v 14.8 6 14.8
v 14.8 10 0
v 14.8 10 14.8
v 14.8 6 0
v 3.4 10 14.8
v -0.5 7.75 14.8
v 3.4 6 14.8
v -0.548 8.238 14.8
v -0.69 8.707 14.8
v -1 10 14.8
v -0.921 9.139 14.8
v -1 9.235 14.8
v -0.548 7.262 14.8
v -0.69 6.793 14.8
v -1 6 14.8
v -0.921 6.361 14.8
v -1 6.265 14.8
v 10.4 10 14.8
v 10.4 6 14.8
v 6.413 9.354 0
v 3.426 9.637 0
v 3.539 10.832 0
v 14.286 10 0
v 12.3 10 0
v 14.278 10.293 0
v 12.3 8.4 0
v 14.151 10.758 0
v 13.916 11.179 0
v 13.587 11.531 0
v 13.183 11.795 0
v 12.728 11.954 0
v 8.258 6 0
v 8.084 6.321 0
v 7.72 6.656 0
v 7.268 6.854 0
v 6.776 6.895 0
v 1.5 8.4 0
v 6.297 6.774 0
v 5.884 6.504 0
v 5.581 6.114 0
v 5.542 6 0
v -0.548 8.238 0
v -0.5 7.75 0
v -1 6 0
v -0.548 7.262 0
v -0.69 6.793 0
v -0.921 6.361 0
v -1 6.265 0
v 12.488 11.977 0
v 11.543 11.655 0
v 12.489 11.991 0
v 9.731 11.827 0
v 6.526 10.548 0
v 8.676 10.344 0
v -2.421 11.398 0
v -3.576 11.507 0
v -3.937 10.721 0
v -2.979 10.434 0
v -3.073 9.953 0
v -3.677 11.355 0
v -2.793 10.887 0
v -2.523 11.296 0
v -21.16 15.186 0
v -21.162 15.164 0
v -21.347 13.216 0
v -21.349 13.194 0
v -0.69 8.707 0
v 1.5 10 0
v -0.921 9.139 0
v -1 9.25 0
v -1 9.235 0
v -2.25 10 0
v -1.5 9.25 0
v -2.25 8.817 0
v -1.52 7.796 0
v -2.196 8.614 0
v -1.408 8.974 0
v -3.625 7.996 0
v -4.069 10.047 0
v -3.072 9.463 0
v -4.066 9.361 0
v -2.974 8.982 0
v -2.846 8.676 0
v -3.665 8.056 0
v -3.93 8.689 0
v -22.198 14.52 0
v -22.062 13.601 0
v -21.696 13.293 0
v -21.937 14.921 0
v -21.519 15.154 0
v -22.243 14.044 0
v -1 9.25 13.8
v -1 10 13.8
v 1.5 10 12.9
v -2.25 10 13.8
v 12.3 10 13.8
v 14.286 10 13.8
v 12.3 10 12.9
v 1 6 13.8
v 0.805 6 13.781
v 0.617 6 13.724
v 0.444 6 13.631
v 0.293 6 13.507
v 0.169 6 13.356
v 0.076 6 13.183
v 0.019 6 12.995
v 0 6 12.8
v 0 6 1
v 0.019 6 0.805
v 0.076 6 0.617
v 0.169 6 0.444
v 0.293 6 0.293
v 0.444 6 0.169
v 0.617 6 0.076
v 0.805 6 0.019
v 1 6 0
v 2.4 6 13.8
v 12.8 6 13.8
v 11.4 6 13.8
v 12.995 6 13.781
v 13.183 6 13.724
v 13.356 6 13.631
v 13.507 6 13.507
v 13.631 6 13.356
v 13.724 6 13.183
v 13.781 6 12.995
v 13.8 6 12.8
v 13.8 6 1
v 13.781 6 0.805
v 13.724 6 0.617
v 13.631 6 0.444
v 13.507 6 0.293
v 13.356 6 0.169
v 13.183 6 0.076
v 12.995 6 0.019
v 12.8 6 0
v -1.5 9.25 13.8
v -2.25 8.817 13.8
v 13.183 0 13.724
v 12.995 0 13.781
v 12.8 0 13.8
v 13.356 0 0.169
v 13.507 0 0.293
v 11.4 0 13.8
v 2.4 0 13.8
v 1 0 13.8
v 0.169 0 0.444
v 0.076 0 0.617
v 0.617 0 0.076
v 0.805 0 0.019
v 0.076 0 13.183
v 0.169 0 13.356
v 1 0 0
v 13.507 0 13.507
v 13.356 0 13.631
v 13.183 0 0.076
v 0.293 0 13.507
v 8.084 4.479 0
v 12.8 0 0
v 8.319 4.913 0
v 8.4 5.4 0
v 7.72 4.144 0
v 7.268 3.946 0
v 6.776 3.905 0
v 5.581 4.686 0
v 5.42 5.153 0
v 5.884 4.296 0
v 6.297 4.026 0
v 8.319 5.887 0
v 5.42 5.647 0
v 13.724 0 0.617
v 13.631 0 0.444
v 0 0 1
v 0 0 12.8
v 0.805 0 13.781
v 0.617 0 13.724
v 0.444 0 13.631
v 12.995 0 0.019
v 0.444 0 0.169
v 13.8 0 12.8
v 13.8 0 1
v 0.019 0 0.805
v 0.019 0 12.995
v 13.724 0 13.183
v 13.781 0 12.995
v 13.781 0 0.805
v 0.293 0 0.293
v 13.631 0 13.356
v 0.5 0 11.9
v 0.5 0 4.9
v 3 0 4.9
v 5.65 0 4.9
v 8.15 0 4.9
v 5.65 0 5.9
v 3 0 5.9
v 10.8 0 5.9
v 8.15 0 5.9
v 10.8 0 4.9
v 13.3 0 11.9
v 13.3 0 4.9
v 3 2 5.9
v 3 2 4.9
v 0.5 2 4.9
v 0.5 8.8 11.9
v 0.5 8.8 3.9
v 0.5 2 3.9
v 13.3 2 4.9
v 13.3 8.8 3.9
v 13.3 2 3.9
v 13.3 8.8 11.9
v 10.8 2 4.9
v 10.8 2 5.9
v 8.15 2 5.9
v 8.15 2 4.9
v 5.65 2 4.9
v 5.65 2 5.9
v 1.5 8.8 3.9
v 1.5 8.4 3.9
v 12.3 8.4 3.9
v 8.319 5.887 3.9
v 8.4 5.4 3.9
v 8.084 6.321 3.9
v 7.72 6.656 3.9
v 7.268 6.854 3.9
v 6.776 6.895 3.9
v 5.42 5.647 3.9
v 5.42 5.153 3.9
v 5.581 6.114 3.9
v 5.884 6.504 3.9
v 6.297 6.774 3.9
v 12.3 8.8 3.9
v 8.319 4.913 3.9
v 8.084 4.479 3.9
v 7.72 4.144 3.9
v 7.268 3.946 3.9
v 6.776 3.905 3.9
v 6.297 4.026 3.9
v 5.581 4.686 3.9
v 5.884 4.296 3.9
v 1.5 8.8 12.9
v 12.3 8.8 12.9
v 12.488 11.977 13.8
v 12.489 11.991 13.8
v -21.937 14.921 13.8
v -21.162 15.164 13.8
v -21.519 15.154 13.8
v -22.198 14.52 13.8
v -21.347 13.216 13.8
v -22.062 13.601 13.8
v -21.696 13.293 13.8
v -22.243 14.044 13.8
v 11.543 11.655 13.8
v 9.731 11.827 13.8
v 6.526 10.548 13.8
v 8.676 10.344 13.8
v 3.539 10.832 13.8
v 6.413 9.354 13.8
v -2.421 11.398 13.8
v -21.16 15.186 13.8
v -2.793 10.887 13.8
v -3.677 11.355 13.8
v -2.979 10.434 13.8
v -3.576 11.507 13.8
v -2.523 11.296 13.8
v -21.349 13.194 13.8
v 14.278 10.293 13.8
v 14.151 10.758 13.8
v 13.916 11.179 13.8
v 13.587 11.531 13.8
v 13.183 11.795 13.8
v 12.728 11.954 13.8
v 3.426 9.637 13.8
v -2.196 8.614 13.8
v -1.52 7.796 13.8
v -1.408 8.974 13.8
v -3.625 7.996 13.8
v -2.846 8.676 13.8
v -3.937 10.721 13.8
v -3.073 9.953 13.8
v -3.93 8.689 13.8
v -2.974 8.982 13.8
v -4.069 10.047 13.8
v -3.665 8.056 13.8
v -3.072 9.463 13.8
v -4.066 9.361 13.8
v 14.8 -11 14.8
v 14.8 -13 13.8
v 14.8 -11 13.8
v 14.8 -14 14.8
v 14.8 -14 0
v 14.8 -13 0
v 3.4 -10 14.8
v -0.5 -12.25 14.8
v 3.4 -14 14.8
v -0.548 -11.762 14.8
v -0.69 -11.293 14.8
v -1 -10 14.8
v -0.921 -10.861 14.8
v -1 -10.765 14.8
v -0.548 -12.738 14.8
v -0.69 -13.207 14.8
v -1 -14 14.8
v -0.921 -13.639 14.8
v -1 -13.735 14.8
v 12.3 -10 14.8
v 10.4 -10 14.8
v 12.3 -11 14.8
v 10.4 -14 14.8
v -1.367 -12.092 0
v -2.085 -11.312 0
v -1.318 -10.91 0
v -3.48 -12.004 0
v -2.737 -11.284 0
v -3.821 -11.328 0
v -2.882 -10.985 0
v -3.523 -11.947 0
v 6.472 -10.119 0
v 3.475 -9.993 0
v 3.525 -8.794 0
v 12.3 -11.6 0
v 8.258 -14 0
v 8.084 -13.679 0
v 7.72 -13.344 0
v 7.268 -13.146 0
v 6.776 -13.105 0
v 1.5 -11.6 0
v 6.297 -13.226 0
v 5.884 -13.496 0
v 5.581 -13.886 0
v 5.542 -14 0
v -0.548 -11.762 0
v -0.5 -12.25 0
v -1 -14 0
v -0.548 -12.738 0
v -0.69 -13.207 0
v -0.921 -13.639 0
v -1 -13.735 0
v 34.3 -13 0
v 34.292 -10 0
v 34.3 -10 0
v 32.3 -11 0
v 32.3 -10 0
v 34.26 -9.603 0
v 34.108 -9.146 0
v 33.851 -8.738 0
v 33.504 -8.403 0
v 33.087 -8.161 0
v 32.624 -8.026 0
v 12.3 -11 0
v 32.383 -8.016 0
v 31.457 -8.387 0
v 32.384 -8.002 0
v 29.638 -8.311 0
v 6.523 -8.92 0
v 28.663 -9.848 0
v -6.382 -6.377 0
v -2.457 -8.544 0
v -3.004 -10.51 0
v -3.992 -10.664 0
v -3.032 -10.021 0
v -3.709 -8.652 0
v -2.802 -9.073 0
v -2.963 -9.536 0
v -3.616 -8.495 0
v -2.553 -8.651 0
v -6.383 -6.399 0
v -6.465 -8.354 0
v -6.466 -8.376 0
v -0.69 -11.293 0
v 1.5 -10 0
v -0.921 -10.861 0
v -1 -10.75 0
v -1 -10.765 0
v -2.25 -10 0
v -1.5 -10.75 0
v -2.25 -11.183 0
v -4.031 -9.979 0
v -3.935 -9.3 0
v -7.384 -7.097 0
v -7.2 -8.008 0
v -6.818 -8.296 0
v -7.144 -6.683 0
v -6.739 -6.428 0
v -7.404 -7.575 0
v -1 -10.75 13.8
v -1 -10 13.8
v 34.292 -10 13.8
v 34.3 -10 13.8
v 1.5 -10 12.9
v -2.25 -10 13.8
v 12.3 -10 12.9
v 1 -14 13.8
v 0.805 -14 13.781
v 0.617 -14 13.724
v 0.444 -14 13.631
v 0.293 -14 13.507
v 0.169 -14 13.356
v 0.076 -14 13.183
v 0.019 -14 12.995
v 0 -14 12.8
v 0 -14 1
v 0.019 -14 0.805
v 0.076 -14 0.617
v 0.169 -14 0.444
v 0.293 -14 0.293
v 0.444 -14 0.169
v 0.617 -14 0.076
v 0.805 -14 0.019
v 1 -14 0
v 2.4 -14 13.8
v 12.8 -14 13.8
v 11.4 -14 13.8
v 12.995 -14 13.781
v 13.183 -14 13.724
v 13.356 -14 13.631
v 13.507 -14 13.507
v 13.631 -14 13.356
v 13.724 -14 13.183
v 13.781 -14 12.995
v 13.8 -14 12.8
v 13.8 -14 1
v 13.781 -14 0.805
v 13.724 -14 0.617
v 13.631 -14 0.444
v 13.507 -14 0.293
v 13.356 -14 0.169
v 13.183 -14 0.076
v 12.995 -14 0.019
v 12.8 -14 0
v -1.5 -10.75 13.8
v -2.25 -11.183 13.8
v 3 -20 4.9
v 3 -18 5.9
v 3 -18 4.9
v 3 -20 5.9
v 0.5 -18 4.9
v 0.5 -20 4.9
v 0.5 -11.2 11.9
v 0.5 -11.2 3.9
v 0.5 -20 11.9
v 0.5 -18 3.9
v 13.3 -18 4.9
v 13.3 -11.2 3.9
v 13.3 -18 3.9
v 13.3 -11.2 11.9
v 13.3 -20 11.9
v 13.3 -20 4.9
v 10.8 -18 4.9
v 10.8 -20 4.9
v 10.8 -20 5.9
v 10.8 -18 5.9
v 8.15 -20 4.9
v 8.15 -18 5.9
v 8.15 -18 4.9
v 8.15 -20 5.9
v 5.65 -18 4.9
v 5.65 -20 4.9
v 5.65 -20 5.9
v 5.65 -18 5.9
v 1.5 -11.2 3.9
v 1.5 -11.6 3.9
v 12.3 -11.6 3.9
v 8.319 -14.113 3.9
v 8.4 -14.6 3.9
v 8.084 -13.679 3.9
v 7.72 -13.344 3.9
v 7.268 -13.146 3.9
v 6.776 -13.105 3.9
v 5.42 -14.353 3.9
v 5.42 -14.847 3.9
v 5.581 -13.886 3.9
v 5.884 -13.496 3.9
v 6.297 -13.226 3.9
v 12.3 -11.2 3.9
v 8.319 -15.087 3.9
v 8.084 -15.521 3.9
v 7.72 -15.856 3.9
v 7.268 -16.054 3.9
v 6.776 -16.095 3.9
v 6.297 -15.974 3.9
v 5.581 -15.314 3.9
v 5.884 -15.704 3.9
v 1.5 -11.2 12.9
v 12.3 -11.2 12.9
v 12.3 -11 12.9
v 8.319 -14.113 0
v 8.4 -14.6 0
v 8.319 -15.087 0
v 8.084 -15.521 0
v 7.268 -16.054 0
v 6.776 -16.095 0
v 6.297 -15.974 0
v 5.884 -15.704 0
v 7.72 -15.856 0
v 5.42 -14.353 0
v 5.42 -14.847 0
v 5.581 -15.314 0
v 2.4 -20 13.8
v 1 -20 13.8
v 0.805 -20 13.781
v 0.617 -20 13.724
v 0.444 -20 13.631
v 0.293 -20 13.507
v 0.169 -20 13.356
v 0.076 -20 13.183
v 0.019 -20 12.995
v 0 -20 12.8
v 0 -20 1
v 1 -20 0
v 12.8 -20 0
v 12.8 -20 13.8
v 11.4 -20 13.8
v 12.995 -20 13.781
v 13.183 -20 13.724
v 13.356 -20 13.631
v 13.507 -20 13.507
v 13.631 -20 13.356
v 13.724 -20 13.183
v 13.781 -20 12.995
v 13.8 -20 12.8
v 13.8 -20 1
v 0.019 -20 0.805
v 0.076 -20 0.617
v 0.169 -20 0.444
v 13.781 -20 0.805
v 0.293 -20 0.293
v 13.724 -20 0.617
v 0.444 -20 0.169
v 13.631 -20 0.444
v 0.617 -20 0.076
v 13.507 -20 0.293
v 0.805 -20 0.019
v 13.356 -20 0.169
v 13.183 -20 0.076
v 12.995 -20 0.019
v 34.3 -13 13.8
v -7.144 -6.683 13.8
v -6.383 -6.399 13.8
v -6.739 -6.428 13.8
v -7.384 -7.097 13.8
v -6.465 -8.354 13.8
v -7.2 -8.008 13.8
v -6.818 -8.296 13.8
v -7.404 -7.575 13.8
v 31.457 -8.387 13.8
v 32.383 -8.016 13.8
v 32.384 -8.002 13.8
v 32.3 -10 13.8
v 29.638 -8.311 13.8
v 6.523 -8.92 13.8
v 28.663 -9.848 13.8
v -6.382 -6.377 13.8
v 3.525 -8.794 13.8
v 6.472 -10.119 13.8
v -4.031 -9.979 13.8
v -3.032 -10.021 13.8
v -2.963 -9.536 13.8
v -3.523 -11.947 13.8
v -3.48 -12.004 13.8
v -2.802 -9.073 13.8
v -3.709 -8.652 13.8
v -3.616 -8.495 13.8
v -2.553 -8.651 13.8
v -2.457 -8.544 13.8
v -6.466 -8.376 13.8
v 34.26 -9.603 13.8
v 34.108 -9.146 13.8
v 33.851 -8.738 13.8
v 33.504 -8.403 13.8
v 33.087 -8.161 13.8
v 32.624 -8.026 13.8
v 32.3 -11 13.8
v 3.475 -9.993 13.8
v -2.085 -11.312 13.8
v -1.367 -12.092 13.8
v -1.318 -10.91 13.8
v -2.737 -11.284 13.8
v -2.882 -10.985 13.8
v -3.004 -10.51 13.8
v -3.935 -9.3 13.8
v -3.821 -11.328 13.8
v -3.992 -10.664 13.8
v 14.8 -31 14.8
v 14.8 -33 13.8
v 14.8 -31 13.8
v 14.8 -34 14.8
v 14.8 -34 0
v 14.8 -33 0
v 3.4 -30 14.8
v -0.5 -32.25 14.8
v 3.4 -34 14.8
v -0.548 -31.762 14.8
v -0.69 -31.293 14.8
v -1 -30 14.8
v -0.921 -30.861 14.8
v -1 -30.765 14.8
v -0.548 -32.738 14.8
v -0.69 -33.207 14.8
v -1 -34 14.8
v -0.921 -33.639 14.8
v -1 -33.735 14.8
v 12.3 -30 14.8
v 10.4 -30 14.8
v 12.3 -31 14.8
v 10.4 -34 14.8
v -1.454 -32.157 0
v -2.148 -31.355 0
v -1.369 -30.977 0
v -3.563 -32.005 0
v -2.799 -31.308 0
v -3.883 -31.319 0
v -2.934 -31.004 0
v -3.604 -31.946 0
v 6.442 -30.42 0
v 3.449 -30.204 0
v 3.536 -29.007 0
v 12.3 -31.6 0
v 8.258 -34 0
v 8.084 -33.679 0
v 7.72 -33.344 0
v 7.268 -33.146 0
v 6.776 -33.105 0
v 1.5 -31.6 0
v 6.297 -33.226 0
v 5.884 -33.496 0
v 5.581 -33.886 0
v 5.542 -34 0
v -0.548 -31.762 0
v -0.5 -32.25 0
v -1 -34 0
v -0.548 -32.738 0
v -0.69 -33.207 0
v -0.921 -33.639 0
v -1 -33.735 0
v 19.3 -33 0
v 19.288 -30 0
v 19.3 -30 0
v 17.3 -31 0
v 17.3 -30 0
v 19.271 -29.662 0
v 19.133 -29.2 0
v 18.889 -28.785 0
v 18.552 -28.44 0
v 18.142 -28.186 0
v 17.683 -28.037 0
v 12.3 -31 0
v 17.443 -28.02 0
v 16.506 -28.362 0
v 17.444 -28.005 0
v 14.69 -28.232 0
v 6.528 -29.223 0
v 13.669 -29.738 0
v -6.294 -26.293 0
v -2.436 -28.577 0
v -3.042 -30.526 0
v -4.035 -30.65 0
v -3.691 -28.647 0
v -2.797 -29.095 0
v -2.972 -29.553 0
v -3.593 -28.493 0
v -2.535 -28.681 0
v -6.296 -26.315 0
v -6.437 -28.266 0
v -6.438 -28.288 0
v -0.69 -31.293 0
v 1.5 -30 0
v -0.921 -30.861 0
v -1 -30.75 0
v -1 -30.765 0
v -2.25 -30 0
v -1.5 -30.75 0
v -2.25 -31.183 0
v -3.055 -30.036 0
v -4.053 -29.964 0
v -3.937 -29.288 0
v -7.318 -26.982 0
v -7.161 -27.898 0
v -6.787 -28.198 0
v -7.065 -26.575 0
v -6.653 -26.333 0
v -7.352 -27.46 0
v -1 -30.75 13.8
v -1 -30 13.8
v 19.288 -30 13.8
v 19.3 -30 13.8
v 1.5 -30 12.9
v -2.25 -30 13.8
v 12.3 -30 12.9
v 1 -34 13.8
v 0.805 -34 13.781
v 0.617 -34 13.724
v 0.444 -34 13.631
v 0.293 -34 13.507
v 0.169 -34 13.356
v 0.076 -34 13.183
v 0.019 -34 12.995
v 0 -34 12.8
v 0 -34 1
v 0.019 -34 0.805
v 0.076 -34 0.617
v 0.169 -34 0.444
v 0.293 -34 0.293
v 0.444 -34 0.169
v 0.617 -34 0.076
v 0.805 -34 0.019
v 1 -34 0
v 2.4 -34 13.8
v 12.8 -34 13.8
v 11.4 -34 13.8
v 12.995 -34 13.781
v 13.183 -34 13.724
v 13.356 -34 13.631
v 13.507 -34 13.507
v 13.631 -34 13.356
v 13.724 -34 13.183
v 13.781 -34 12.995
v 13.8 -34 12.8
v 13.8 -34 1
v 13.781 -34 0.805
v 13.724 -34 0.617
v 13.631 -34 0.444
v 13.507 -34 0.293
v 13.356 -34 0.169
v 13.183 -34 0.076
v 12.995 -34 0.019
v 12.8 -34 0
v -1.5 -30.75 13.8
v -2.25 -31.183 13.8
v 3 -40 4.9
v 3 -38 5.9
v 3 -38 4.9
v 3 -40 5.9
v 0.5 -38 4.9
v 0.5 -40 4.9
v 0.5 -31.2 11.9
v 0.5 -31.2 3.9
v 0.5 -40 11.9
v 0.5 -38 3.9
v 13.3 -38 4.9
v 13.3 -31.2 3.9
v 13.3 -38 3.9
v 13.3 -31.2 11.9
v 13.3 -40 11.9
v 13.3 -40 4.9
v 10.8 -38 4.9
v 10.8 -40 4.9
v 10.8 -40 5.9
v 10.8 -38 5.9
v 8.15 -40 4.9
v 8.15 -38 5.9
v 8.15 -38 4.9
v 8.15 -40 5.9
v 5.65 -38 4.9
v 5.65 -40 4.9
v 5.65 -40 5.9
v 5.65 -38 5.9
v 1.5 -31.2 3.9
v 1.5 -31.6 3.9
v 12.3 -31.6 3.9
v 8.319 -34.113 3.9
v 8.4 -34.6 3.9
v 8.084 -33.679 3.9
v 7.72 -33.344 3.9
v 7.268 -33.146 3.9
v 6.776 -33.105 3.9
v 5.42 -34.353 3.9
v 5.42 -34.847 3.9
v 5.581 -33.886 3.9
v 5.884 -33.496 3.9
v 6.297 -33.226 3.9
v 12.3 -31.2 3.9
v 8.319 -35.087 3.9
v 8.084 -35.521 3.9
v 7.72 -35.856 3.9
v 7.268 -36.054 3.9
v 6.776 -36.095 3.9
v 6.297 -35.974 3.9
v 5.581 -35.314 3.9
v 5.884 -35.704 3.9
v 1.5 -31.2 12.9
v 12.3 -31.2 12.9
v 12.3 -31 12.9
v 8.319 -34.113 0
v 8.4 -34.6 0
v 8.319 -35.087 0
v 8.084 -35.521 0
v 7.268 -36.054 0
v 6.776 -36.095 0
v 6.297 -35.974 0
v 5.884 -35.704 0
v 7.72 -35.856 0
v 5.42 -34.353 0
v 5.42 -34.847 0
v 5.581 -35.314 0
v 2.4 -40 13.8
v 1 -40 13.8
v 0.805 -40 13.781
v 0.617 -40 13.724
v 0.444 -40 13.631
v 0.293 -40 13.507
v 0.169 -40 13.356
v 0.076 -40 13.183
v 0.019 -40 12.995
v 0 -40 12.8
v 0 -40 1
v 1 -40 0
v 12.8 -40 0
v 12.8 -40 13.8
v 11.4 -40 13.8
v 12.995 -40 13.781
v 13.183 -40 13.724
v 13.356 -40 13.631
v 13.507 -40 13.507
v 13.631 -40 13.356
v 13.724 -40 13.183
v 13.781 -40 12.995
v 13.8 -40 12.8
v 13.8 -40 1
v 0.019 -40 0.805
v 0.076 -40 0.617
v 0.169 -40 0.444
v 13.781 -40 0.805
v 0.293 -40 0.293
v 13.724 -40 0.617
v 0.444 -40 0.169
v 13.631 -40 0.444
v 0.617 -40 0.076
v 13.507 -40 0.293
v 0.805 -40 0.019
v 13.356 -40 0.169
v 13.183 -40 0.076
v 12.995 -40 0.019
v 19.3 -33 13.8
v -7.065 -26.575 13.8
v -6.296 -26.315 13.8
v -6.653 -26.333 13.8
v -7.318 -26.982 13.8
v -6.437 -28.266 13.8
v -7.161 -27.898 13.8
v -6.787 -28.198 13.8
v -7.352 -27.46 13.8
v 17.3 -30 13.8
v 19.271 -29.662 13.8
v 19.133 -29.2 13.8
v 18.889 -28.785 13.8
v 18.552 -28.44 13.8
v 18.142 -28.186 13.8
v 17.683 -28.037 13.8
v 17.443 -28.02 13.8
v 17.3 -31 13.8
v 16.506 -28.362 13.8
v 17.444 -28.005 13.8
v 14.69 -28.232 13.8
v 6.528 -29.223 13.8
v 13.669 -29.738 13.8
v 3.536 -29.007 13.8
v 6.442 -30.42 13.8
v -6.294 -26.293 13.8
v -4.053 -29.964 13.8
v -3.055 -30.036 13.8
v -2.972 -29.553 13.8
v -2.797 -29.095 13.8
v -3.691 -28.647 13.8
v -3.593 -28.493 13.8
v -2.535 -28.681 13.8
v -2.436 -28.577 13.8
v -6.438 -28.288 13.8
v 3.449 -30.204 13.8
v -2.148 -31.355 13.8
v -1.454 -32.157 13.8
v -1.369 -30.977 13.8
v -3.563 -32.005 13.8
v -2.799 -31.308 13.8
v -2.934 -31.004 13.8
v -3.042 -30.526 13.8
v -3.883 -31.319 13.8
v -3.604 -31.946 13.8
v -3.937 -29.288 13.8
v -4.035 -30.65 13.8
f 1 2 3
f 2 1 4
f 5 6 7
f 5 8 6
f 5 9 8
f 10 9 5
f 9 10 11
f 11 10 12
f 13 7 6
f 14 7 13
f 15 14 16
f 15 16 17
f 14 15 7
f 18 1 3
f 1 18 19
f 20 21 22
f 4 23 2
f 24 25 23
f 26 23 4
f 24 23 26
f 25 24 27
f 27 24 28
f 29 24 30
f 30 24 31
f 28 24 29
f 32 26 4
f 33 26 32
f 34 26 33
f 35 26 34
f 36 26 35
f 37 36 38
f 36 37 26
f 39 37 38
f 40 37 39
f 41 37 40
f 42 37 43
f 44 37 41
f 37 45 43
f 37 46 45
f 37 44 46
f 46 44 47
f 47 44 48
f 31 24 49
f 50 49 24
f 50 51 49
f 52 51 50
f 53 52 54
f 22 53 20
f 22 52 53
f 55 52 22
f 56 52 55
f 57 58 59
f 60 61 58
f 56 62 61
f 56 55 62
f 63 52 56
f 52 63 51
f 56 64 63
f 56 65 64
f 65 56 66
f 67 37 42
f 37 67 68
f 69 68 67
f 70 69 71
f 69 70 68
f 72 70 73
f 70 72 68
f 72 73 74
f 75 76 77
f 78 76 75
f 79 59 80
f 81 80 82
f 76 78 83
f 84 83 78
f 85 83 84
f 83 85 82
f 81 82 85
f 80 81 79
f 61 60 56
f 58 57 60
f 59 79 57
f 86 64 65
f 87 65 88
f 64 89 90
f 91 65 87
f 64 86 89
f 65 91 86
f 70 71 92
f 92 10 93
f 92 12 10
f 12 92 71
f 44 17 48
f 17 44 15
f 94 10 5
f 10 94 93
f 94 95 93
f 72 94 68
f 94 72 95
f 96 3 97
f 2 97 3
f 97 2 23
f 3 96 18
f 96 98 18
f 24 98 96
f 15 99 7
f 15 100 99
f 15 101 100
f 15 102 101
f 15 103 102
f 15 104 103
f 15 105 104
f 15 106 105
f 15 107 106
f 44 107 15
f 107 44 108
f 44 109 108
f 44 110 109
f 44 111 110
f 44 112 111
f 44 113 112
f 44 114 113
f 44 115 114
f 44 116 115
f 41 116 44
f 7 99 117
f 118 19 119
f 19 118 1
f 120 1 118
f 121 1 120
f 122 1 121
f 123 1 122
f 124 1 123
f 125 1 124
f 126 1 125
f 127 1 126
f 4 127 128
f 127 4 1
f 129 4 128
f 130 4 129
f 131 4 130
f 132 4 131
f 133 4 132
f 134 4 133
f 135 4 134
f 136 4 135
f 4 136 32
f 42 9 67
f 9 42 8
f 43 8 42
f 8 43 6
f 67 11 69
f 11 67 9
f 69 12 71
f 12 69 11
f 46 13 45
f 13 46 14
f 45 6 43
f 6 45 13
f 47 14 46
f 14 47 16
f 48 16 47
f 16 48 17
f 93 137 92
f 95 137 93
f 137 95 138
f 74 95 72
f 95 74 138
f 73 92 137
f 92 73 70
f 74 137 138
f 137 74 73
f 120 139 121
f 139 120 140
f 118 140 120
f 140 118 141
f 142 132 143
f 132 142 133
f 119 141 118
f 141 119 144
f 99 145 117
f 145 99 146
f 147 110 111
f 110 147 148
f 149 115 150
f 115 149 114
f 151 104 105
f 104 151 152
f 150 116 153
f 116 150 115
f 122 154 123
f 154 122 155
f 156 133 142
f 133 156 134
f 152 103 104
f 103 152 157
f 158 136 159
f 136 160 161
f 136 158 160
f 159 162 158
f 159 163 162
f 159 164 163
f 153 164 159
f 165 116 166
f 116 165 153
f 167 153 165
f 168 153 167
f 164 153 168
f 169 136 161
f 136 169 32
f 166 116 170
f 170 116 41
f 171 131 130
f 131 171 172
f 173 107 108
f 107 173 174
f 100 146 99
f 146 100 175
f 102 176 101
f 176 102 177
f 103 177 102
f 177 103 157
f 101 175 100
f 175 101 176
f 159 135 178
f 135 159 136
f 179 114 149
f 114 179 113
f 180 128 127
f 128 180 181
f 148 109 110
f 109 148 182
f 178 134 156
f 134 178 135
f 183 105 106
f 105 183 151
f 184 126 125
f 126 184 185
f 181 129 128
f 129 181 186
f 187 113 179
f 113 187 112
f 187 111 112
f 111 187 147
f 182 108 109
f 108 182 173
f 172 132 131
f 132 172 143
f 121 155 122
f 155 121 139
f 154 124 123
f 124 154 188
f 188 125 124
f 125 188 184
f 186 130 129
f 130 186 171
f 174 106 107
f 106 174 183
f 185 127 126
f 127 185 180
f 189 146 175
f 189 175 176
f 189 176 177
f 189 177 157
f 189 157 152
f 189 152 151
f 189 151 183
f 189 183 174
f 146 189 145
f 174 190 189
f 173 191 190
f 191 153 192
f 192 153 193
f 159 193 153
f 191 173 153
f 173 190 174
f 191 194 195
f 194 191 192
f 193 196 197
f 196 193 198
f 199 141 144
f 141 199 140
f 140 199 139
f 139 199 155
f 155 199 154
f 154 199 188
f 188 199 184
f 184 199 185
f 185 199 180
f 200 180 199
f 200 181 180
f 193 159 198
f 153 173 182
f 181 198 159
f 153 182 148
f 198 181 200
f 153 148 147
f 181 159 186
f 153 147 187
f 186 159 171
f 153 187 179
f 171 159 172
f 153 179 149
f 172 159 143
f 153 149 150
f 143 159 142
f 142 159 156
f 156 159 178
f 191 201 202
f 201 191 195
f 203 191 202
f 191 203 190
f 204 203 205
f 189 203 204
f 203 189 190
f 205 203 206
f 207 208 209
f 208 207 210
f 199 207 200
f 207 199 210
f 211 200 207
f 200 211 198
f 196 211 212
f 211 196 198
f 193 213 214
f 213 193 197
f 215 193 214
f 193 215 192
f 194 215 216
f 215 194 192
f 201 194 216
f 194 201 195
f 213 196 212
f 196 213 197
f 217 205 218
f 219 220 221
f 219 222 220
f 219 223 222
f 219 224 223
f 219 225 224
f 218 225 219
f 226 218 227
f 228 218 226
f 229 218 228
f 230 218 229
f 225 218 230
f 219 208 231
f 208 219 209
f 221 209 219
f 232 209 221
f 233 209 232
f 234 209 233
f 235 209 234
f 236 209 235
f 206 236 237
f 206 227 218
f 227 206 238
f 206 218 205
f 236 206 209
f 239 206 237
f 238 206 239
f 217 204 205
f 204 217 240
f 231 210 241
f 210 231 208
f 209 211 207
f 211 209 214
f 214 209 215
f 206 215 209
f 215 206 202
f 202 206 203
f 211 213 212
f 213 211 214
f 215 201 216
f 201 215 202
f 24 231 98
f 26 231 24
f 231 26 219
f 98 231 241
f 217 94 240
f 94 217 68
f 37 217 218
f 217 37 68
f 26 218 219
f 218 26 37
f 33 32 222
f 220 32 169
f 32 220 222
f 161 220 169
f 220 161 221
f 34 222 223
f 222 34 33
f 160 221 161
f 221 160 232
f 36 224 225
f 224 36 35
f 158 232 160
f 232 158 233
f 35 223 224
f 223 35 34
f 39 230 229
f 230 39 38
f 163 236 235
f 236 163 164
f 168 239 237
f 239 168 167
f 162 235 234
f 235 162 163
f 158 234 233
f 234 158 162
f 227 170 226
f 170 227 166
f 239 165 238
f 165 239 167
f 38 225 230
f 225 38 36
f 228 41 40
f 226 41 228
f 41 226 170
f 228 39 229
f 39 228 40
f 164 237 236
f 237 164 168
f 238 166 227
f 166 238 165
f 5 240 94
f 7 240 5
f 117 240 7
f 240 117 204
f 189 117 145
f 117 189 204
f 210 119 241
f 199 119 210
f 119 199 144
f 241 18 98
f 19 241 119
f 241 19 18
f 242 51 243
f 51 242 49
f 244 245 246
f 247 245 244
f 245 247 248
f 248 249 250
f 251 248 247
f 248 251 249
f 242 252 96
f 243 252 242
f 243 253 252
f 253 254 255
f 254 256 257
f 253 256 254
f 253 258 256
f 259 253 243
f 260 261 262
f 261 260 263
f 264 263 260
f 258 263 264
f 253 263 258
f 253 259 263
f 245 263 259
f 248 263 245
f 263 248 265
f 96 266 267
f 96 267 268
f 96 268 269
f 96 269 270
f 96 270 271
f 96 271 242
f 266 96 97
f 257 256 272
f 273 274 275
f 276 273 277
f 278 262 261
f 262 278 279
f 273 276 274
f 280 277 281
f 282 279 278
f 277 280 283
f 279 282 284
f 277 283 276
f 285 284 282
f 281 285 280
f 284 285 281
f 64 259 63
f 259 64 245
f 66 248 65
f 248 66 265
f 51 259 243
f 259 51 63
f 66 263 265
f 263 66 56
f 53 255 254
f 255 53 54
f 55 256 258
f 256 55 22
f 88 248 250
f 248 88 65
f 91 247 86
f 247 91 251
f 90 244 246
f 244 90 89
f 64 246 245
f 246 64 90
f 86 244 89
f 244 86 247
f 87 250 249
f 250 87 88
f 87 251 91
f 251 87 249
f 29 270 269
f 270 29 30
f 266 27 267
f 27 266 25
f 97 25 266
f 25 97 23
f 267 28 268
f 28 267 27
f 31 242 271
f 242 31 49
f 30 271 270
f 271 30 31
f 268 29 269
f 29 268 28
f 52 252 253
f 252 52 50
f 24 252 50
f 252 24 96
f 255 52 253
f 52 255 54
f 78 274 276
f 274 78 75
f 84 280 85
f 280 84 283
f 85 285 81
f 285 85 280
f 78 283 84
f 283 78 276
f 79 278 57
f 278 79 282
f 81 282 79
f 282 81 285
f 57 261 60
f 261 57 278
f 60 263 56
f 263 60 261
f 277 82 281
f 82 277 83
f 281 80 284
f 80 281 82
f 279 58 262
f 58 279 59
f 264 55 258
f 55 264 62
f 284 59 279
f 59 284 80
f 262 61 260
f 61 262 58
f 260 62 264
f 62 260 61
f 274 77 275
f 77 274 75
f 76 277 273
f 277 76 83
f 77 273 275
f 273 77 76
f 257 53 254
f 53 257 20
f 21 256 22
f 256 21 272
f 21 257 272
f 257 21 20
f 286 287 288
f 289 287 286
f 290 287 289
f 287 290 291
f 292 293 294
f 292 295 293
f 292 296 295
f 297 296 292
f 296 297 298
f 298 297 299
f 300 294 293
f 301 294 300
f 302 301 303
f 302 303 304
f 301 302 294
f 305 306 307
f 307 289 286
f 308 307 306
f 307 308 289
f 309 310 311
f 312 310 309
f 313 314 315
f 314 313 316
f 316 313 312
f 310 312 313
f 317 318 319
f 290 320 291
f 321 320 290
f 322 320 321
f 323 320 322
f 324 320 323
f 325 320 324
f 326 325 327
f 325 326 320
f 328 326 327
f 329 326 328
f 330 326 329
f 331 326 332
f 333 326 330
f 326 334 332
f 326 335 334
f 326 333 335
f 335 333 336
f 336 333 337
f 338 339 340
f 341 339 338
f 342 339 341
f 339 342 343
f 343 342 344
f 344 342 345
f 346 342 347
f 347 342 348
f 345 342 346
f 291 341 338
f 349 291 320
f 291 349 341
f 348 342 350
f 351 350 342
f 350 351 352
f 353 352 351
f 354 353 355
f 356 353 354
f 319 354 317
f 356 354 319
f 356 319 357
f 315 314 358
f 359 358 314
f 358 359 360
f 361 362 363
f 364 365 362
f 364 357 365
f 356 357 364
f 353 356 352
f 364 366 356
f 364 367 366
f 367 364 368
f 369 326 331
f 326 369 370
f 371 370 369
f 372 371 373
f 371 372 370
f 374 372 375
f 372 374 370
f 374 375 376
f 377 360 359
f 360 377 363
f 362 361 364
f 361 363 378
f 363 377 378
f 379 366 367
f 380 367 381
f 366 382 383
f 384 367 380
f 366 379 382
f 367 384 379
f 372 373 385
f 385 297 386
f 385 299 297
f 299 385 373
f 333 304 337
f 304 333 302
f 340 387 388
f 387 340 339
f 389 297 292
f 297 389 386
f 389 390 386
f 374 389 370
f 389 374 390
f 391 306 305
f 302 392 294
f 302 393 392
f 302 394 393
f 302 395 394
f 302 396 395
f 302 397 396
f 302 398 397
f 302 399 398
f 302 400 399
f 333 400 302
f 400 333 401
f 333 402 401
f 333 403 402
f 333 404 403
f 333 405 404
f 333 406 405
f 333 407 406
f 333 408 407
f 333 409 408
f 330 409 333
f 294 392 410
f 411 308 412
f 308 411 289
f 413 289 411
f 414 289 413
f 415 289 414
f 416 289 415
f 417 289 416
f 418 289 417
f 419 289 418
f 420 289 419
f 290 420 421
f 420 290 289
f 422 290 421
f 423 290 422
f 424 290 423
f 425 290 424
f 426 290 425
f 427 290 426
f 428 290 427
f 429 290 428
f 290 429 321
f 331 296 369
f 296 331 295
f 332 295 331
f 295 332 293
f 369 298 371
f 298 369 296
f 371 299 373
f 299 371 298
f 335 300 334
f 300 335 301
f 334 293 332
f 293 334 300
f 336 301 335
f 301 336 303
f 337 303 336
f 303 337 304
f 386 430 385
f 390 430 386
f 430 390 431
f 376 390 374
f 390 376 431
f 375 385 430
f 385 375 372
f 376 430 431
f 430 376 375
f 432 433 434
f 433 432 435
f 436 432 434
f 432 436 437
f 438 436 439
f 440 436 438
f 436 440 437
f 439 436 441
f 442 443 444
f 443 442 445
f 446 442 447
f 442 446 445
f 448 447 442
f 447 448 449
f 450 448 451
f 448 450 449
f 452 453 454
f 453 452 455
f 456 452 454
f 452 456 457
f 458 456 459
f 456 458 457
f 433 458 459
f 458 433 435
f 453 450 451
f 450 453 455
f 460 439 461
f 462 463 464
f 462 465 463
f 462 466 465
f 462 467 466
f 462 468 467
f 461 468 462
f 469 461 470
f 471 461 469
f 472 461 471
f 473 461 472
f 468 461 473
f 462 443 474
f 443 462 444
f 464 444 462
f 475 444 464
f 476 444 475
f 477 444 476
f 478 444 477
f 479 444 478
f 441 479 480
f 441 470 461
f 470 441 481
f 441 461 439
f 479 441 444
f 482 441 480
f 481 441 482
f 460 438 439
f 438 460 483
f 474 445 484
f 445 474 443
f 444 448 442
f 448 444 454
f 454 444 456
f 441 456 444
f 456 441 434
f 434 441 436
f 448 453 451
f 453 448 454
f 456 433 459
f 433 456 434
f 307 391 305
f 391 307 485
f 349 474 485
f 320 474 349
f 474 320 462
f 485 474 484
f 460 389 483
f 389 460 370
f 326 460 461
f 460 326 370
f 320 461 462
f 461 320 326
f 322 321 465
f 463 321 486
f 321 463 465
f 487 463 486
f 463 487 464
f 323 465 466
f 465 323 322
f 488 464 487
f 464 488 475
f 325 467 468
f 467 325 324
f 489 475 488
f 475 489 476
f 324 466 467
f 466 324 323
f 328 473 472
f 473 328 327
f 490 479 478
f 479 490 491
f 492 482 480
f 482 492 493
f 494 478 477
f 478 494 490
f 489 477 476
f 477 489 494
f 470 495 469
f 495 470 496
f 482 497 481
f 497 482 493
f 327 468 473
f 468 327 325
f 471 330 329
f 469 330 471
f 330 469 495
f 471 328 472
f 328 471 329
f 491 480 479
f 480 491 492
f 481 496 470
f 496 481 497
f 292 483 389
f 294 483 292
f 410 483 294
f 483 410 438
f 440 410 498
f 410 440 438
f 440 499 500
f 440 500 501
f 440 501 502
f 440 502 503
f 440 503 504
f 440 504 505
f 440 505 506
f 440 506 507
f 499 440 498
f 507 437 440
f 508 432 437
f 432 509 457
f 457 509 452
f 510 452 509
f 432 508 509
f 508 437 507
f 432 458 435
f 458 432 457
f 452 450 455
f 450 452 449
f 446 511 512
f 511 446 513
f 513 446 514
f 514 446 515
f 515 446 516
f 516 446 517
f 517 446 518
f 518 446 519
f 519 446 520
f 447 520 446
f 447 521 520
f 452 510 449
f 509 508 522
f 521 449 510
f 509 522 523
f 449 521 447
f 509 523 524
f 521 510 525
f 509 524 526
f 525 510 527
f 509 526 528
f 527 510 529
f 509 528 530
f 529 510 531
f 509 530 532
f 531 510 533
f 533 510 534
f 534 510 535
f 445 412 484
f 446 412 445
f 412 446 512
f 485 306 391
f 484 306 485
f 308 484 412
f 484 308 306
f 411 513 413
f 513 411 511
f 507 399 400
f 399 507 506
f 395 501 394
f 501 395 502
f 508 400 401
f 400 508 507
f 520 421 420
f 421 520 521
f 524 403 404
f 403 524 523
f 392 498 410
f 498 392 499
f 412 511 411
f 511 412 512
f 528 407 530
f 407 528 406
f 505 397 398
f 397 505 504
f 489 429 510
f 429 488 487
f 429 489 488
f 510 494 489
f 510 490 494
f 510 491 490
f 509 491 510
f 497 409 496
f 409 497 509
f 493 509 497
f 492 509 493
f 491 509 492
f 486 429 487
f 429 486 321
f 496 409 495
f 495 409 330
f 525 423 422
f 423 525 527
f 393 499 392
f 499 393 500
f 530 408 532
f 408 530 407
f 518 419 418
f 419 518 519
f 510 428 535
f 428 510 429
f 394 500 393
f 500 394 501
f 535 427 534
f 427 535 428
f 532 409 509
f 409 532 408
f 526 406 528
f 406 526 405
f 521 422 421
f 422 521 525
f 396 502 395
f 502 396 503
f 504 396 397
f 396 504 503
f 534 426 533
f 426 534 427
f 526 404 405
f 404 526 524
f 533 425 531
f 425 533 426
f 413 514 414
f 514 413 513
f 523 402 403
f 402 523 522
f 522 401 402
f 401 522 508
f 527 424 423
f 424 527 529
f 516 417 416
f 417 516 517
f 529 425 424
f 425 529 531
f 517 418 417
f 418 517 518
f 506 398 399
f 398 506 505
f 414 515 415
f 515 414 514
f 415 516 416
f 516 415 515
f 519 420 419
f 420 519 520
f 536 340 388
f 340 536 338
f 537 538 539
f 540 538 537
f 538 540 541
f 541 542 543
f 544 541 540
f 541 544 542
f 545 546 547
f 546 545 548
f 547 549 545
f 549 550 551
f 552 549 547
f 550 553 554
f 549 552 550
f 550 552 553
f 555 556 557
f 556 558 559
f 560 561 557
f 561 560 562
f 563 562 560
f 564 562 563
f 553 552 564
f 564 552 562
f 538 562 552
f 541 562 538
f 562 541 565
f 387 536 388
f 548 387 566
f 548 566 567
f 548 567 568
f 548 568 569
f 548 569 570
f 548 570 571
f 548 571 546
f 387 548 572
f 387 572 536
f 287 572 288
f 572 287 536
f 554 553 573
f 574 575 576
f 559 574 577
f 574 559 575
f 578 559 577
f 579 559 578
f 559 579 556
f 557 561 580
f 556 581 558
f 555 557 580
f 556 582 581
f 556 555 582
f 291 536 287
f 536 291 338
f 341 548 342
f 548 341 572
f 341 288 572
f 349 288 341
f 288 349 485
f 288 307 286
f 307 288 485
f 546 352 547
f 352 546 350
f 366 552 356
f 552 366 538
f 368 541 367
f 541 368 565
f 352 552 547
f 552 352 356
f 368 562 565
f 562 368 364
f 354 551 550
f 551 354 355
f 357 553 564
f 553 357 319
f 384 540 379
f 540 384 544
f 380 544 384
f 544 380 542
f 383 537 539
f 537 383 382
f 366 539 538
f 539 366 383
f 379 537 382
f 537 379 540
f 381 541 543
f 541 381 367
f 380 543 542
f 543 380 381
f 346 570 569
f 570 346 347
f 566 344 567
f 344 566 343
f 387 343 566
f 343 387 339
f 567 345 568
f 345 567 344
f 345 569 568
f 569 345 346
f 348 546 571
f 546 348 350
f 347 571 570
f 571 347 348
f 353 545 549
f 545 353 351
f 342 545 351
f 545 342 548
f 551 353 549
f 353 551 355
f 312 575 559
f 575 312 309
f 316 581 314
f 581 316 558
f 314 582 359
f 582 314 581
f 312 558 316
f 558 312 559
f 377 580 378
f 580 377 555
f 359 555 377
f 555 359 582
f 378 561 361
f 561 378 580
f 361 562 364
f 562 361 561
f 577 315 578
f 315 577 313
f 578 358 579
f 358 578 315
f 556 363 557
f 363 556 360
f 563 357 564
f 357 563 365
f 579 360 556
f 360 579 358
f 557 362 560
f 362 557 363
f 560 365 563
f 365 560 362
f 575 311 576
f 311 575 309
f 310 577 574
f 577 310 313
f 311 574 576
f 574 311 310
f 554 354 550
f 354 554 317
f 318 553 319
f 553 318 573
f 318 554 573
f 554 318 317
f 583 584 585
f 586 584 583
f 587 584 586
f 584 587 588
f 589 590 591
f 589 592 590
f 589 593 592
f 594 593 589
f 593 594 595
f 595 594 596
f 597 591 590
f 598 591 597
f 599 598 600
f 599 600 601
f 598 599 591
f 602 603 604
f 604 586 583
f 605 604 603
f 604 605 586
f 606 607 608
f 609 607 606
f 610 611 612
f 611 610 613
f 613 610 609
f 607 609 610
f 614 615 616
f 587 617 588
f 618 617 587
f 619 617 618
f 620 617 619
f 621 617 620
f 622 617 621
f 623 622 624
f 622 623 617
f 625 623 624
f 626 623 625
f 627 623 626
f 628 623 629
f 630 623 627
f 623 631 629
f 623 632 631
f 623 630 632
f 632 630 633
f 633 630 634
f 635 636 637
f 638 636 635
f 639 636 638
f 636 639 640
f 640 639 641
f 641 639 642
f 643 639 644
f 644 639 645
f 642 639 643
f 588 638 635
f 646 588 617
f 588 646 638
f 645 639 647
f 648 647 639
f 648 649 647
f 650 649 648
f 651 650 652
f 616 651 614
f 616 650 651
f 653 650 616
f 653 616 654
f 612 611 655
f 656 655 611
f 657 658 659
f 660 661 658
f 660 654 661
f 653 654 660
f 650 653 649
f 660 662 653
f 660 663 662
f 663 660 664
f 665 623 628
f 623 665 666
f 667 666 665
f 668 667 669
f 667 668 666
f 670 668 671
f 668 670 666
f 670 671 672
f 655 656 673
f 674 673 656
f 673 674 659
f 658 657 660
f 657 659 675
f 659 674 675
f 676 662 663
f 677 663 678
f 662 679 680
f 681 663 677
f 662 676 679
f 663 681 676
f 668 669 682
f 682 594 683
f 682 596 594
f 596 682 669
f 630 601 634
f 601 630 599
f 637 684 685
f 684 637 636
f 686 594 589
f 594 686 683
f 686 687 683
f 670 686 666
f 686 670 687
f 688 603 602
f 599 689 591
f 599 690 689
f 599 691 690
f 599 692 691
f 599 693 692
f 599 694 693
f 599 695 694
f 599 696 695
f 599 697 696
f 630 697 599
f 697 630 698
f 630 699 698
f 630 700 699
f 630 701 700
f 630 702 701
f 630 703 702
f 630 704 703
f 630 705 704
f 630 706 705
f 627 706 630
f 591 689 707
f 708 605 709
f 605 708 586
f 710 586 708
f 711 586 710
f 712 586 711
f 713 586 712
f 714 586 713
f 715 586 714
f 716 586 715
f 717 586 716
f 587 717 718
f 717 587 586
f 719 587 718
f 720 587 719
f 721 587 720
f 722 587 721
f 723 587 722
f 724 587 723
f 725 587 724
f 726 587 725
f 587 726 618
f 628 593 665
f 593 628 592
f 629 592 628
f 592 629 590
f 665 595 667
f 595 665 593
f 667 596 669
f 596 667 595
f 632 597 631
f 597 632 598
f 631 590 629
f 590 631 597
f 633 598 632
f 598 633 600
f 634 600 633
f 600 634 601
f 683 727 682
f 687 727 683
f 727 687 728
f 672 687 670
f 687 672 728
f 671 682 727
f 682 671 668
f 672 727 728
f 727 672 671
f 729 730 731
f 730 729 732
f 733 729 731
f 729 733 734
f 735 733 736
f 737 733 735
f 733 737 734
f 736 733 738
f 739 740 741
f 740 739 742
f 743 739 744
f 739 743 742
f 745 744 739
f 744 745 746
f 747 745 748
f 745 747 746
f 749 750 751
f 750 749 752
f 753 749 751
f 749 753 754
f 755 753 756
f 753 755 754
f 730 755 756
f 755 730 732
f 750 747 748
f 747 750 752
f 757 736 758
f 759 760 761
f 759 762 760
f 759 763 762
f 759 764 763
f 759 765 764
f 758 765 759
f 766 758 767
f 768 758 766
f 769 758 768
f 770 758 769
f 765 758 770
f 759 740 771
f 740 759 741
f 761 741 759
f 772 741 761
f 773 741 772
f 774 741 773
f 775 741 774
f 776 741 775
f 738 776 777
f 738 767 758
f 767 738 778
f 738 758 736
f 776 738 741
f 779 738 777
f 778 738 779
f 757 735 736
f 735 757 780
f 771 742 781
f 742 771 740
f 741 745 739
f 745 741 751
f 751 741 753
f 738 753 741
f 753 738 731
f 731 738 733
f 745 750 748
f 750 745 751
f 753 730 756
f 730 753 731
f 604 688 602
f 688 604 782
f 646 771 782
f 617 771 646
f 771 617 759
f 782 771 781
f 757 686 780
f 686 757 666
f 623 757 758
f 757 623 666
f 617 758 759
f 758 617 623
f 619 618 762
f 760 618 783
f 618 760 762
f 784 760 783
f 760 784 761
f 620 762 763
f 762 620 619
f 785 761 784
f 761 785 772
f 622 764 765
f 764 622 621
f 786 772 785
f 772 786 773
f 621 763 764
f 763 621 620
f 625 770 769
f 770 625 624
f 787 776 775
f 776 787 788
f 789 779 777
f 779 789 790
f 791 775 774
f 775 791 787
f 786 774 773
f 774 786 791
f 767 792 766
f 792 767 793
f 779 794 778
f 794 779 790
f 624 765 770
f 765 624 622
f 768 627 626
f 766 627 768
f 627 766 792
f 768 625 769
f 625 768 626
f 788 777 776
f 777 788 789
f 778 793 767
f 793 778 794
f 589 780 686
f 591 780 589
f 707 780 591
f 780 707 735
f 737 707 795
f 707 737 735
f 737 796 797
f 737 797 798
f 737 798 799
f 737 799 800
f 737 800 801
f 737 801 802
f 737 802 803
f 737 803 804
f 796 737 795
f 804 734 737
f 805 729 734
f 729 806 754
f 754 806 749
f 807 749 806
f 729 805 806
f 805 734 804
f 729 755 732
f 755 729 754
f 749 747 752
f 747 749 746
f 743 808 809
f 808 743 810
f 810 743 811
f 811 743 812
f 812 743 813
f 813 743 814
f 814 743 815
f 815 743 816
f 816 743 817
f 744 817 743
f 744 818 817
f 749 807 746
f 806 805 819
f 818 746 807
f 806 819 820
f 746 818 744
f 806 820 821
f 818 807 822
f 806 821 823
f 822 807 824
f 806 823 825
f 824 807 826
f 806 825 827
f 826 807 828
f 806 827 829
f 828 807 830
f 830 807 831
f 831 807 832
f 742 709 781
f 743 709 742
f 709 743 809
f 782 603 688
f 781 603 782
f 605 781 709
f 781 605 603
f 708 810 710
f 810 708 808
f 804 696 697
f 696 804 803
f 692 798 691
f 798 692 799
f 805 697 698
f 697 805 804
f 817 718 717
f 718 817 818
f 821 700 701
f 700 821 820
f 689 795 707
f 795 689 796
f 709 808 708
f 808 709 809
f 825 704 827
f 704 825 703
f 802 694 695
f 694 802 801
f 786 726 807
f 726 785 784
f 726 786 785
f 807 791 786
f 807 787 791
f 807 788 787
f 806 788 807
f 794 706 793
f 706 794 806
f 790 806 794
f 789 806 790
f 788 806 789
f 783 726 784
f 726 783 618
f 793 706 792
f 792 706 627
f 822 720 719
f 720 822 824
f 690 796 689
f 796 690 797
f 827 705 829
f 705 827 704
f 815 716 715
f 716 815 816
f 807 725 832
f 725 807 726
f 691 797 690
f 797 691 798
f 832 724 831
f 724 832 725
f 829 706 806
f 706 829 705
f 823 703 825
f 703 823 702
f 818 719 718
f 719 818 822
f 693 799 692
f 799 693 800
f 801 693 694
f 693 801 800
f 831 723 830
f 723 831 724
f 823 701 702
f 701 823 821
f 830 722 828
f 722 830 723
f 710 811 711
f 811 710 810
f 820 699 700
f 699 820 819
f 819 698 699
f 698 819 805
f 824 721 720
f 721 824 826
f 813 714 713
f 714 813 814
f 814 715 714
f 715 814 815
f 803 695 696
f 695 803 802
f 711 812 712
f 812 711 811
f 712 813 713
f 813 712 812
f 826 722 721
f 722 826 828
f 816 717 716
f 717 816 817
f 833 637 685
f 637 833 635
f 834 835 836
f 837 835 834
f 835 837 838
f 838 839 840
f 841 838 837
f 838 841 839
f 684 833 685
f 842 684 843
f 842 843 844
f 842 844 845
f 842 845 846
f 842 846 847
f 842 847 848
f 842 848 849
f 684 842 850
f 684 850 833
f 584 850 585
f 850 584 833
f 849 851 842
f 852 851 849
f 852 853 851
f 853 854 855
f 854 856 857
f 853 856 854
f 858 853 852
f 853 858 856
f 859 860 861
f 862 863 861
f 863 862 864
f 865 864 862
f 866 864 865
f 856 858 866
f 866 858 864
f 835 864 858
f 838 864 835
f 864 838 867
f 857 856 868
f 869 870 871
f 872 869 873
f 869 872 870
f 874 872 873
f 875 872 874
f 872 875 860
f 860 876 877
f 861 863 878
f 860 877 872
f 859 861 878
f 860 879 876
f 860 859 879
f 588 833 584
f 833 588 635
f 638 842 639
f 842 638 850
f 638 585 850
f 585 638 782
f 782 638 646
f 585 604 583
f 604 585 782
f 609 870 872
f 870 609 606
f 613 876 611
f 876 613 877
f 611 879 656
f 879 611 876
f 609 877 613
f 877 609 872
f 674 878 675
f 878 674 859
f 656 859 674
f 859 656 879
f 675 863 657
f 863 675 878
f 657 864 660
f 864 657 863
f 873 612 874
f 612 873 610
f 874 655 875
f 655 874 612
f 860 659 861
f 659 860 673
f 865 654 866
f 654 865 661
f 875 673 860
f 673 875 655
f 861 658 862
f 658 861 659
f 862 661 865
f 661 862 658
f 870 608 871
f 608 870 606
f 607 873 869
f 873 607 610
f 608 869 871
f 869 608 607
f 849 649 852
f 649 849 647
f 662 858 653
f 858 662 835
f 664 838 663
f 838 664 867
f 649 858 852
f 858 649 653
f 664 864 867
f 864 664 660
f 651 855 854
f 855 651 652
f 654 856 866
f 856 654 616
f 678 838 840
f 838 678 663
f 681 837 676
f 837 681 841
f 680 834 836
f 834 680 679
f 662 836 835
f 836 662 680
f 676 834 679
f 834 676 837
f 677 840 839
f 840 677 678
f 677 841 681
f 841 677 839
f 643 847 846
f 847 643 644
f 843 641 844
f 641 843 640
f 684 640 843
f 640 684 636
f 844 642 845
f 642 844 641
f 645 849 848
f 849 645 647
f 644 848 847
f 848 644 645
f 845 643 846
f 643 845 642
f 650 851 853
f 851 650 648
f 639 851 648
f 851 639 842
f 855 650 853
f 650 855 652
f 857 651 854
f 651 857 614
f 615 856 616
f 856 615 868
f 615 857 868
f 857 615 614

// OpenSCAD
// Examples
switch_carrier(20, 0);

translate([0, -20, 0]) 
switch_carrier(5, 20);

translate([0, -40, 0]) 
switch_carrier(5, 5);

module switch_carrier(front_overhang = 0, rear_overhang = 0)
{
    // front_overhang and rear_overhang extend the top surface on the end opposite the hinge, and the end with the hinge, respectively.

    // This makes a cutout that leaves room to plug a 3-position JST-XH connector onto the
    // two "normally open" pins of the switch.
    connector_space = false;

    // Outer size of the main body of the adapter. Note that "height" is a bit of a misnomer,
    // as the top deck extends well beyond this.
    // The width may need fine adjustment based on your printer and the size of the hole you're
    // fitting the switch into. This setting works well for my printer, when using a hole that
    // I've modeled as exactly 14x14mm.
    body_width = 13.8;
    body_height = 10;

    // Dimensions of the microswitch. I'm using OMRON D2FC-F-7N switches.
    // Note that these dimensions are likely to be finicky and dependent on the accuracy of your printer.
    switch_length = 12.8;
    switch_width = 6;
    switch_height = 6.8;

    // This is the thickness of the top over the hinge cut. I recommend tweaking this to make your
    // slicer lay this down as a single line for flexibility. When slicing with Cura, if I make it
    // too thin that part of the model actually gets omitted, and if I make it too thick it gets
    // messy as well.
    hinge_thickness = 0.18;

    top_thickness = 2;
    top_safety = front_overhang >= 1;

    $fs=0.5;

    switch_bottom_height = body_height - (switch_height + 1.2);
    switch_centering = (body_width - switch_length) / 2;
    top_rotation_base = switch_centering + switch_length - 1;

    // Test cube to help me see where the rotation point of the top is
    //translate([top_rotation_base + rear_overhang, body_height, 5])
    //cube([10, 10, 10]);

    // Length of the top, not counting rounded ends
    top_length = body_width + front_overhang + rear_overhang;
    // Final X offset the top will be shifted by
    top_offset =  switch_centering - front_overhang - 2;

    // distance from the left edge of the switch to the center of the contact
    contact_offset = 4.5;
    // space we want to leave under the contact at rest
    contact_space = 1.5;
    // Calculate a top angle that will leave enough space under the center of the contact at rest.
    contact_distance = (top_rotation_base + rear_overhang) - (switch_centering + 4.5);
    top_angle =  atan(contact_space/(rear_overhang + body_width + top_thickness));

    module switch_cutout()
    {
        difference()
        {
            translate([0, 0, 0])
            {
                // main switch body
                translate([0, switch_bottom_height, 0])
                cube([switch_length, switch_height, body_width]);
                // top clearance
                translate([1, switch_bottom_height + switch_height - 0.4, -body_width])
                cube([switch_length - 2, 3.0, body_width * 2]);
                // pushout hole
                translate([
                    switch_length / 2, 
                    switch_bottom_height + switch_height / 2, 
                    -body_width
                ])    
                cylinder(d=3, h=body_width * 2);
                
                translate([0, -1, 0])
                {
                    translate([0, 0, 1])
                    {
                        // Cutouts for contacts
                        cube([2.5, 5, 13]);
                        translate([switch_length - 2.5, 0, 0])
                        cube([2.5, 5, 13]);
                        translate([(switch_length - 2.5) / 2, 0, 0])
                        cube([2.5, 5, 13]);
                    }

                    // The bottom supports don't need to extend past the center of the switch.
                    translate([2, 0, (switch_width / 2) - 1])
                    cube([9, 5, body_width - 1]);
                    
                }
            }
            // chamfer the inside corners, but leave room to get the switch out past the supports.
            translate([0, 0, switch_width + ((switch_width / 2) - 1)])
            {
                rotate([0, -45, 0])
                cube([5, body_height, 5]);

                translate([switch_length, 0, 0])
                rotate([0, -45, 0])
                cube([5, body_height, 5]);
            }
        }
        
    }

    module body()
    {
        difference()
        {
            union()
            {
                // main body
                // Instead of this, give the body slightly rounded outside corners.
                // cube([body_width, body_height, body_width]);
                rotate([-90, 0, 0])
                translate([0, -body_width, 0])
                linear_extrude(body_height)
                offset(1, $fn=32) offset(delta=-1)
                square(body_width, body_width);
            
                // lip
                difference()
                {
                    translate([-1, 6, 0])
                    cube([body_width + 2, body_height - 6, body_width + 1]);

                    if (top_safety)
                    {
                        translate([-3, body_height - 2.25, 0])
                        cylinder(d=5, h=body_width + 1, $fn=32);
                    }
                }
                
                // Extension for hinge
                if (rear_overhang > 0)
                {
                    translate([top_rotation_base + top_thickness, body_height - 3, 0])
                    cube([rear_overhang, 3, body_width]);
                }
                
                // body side of safety catch
                if (top_safety)
                {
                    translate([-2.25, body_height - .75, 0])
                    {
                        cube([2.25, .75, body_width]);
                        translate([.25, 0, 0])
                        cylinder(d=1, h=body_width, $fn=3);
                    }
                }
            }
            // cut for clearance on extended hinge
            if (rear_overhang > 0)
            {
                translate([top_rotation_base, body_height - 1, 0])
                cube([rear_overhang, 1, body_width + 1]);
            }
            
            if (connector_space)
            {
                translate([0, 0, 1.0 + (body_width - switch_width)/2])
                cube([8.5, switch_bottom_height, body_width + 1]);
            }
        }

    }

    module top()
    {
        translate([0, body_height, 0])
        translate([top_offset, 0, 0])
        translate([top_length, 0, 0]) rotate([0, 0, -top_angle]) translate([-top_length, 0, 0])
        {
            {
                difference()
                {
                    union()
                    {
                        // main top surface
                        cube([top_length, top_thickness, body_width]);

                        // Rounded free end
                        translate([0, top_thickness / 2, 0])
                        cylinder(d=top_thickness, h=body_width);

                        // Rounded hinge end
                        translate([top_length, 0, 0])
                        cylinder(r=top_thickness, h=body_width);

                    }
                    
                    // cut bottom half of hinge end round
                    translate([top_length - top_thickness, -top_thickness, 0])
                    cube([top_thickness * 2, top_thickness, body_width]);

                    // hinge cut
                    translate([top_length + hinge_thickness - (top_thickness), 0, 0])
                    cylinder(r=top_thickness - hinge_thickness, h=body_width, $fn=6);
                }
                
                // switch contact
                // This wants to be centered on a point contact_offset from the left end of the switch.
                contact_width = 3;
                translate([-top_offset + switch_centering + contact_offset - contact_width / 2, 
                    -1.2,
                    0])
                cube([3, 2.4, body_width]);
                
                if (top_safety)
                {
                    translate([-top_offset -3.5, -3.5, 0])
                    {
                        difference()
                        {
                            // downward stem
                            intersection()
                            {
                                translate([-1, 0, 0])
                                cube([2.25, 3.25 + top_thickness/2, body_width]);
                                
                                translate([3, 2, 0])
                                cylinder(d=7, h=body_width, $fn=32);
                            }
                            
                            // clearance cut
                            translate([3, 2, 0])
                            cylinder(d=5, h=body_width, $fn=32);

                        }
                        
                        // cross piece
                        translate([.5, 0, 0])
                        cube([1.75, .75, body_width]);
                        
                        // upward-facing tooth
                        translate([2, .75, 0])
                        rotate([0, 0, 180])
                        cylinder(d=1, h=body_width, $fn=3);
                    }
                }
                
            }
        }
    }

    // Assemble the pieces
    difference()
    {
        union()
        {
            body();
        }
        
        translate([switch_centering, 0, (body_width - switch_width)/2])
        switch_cutout();
    }
    top();
}
